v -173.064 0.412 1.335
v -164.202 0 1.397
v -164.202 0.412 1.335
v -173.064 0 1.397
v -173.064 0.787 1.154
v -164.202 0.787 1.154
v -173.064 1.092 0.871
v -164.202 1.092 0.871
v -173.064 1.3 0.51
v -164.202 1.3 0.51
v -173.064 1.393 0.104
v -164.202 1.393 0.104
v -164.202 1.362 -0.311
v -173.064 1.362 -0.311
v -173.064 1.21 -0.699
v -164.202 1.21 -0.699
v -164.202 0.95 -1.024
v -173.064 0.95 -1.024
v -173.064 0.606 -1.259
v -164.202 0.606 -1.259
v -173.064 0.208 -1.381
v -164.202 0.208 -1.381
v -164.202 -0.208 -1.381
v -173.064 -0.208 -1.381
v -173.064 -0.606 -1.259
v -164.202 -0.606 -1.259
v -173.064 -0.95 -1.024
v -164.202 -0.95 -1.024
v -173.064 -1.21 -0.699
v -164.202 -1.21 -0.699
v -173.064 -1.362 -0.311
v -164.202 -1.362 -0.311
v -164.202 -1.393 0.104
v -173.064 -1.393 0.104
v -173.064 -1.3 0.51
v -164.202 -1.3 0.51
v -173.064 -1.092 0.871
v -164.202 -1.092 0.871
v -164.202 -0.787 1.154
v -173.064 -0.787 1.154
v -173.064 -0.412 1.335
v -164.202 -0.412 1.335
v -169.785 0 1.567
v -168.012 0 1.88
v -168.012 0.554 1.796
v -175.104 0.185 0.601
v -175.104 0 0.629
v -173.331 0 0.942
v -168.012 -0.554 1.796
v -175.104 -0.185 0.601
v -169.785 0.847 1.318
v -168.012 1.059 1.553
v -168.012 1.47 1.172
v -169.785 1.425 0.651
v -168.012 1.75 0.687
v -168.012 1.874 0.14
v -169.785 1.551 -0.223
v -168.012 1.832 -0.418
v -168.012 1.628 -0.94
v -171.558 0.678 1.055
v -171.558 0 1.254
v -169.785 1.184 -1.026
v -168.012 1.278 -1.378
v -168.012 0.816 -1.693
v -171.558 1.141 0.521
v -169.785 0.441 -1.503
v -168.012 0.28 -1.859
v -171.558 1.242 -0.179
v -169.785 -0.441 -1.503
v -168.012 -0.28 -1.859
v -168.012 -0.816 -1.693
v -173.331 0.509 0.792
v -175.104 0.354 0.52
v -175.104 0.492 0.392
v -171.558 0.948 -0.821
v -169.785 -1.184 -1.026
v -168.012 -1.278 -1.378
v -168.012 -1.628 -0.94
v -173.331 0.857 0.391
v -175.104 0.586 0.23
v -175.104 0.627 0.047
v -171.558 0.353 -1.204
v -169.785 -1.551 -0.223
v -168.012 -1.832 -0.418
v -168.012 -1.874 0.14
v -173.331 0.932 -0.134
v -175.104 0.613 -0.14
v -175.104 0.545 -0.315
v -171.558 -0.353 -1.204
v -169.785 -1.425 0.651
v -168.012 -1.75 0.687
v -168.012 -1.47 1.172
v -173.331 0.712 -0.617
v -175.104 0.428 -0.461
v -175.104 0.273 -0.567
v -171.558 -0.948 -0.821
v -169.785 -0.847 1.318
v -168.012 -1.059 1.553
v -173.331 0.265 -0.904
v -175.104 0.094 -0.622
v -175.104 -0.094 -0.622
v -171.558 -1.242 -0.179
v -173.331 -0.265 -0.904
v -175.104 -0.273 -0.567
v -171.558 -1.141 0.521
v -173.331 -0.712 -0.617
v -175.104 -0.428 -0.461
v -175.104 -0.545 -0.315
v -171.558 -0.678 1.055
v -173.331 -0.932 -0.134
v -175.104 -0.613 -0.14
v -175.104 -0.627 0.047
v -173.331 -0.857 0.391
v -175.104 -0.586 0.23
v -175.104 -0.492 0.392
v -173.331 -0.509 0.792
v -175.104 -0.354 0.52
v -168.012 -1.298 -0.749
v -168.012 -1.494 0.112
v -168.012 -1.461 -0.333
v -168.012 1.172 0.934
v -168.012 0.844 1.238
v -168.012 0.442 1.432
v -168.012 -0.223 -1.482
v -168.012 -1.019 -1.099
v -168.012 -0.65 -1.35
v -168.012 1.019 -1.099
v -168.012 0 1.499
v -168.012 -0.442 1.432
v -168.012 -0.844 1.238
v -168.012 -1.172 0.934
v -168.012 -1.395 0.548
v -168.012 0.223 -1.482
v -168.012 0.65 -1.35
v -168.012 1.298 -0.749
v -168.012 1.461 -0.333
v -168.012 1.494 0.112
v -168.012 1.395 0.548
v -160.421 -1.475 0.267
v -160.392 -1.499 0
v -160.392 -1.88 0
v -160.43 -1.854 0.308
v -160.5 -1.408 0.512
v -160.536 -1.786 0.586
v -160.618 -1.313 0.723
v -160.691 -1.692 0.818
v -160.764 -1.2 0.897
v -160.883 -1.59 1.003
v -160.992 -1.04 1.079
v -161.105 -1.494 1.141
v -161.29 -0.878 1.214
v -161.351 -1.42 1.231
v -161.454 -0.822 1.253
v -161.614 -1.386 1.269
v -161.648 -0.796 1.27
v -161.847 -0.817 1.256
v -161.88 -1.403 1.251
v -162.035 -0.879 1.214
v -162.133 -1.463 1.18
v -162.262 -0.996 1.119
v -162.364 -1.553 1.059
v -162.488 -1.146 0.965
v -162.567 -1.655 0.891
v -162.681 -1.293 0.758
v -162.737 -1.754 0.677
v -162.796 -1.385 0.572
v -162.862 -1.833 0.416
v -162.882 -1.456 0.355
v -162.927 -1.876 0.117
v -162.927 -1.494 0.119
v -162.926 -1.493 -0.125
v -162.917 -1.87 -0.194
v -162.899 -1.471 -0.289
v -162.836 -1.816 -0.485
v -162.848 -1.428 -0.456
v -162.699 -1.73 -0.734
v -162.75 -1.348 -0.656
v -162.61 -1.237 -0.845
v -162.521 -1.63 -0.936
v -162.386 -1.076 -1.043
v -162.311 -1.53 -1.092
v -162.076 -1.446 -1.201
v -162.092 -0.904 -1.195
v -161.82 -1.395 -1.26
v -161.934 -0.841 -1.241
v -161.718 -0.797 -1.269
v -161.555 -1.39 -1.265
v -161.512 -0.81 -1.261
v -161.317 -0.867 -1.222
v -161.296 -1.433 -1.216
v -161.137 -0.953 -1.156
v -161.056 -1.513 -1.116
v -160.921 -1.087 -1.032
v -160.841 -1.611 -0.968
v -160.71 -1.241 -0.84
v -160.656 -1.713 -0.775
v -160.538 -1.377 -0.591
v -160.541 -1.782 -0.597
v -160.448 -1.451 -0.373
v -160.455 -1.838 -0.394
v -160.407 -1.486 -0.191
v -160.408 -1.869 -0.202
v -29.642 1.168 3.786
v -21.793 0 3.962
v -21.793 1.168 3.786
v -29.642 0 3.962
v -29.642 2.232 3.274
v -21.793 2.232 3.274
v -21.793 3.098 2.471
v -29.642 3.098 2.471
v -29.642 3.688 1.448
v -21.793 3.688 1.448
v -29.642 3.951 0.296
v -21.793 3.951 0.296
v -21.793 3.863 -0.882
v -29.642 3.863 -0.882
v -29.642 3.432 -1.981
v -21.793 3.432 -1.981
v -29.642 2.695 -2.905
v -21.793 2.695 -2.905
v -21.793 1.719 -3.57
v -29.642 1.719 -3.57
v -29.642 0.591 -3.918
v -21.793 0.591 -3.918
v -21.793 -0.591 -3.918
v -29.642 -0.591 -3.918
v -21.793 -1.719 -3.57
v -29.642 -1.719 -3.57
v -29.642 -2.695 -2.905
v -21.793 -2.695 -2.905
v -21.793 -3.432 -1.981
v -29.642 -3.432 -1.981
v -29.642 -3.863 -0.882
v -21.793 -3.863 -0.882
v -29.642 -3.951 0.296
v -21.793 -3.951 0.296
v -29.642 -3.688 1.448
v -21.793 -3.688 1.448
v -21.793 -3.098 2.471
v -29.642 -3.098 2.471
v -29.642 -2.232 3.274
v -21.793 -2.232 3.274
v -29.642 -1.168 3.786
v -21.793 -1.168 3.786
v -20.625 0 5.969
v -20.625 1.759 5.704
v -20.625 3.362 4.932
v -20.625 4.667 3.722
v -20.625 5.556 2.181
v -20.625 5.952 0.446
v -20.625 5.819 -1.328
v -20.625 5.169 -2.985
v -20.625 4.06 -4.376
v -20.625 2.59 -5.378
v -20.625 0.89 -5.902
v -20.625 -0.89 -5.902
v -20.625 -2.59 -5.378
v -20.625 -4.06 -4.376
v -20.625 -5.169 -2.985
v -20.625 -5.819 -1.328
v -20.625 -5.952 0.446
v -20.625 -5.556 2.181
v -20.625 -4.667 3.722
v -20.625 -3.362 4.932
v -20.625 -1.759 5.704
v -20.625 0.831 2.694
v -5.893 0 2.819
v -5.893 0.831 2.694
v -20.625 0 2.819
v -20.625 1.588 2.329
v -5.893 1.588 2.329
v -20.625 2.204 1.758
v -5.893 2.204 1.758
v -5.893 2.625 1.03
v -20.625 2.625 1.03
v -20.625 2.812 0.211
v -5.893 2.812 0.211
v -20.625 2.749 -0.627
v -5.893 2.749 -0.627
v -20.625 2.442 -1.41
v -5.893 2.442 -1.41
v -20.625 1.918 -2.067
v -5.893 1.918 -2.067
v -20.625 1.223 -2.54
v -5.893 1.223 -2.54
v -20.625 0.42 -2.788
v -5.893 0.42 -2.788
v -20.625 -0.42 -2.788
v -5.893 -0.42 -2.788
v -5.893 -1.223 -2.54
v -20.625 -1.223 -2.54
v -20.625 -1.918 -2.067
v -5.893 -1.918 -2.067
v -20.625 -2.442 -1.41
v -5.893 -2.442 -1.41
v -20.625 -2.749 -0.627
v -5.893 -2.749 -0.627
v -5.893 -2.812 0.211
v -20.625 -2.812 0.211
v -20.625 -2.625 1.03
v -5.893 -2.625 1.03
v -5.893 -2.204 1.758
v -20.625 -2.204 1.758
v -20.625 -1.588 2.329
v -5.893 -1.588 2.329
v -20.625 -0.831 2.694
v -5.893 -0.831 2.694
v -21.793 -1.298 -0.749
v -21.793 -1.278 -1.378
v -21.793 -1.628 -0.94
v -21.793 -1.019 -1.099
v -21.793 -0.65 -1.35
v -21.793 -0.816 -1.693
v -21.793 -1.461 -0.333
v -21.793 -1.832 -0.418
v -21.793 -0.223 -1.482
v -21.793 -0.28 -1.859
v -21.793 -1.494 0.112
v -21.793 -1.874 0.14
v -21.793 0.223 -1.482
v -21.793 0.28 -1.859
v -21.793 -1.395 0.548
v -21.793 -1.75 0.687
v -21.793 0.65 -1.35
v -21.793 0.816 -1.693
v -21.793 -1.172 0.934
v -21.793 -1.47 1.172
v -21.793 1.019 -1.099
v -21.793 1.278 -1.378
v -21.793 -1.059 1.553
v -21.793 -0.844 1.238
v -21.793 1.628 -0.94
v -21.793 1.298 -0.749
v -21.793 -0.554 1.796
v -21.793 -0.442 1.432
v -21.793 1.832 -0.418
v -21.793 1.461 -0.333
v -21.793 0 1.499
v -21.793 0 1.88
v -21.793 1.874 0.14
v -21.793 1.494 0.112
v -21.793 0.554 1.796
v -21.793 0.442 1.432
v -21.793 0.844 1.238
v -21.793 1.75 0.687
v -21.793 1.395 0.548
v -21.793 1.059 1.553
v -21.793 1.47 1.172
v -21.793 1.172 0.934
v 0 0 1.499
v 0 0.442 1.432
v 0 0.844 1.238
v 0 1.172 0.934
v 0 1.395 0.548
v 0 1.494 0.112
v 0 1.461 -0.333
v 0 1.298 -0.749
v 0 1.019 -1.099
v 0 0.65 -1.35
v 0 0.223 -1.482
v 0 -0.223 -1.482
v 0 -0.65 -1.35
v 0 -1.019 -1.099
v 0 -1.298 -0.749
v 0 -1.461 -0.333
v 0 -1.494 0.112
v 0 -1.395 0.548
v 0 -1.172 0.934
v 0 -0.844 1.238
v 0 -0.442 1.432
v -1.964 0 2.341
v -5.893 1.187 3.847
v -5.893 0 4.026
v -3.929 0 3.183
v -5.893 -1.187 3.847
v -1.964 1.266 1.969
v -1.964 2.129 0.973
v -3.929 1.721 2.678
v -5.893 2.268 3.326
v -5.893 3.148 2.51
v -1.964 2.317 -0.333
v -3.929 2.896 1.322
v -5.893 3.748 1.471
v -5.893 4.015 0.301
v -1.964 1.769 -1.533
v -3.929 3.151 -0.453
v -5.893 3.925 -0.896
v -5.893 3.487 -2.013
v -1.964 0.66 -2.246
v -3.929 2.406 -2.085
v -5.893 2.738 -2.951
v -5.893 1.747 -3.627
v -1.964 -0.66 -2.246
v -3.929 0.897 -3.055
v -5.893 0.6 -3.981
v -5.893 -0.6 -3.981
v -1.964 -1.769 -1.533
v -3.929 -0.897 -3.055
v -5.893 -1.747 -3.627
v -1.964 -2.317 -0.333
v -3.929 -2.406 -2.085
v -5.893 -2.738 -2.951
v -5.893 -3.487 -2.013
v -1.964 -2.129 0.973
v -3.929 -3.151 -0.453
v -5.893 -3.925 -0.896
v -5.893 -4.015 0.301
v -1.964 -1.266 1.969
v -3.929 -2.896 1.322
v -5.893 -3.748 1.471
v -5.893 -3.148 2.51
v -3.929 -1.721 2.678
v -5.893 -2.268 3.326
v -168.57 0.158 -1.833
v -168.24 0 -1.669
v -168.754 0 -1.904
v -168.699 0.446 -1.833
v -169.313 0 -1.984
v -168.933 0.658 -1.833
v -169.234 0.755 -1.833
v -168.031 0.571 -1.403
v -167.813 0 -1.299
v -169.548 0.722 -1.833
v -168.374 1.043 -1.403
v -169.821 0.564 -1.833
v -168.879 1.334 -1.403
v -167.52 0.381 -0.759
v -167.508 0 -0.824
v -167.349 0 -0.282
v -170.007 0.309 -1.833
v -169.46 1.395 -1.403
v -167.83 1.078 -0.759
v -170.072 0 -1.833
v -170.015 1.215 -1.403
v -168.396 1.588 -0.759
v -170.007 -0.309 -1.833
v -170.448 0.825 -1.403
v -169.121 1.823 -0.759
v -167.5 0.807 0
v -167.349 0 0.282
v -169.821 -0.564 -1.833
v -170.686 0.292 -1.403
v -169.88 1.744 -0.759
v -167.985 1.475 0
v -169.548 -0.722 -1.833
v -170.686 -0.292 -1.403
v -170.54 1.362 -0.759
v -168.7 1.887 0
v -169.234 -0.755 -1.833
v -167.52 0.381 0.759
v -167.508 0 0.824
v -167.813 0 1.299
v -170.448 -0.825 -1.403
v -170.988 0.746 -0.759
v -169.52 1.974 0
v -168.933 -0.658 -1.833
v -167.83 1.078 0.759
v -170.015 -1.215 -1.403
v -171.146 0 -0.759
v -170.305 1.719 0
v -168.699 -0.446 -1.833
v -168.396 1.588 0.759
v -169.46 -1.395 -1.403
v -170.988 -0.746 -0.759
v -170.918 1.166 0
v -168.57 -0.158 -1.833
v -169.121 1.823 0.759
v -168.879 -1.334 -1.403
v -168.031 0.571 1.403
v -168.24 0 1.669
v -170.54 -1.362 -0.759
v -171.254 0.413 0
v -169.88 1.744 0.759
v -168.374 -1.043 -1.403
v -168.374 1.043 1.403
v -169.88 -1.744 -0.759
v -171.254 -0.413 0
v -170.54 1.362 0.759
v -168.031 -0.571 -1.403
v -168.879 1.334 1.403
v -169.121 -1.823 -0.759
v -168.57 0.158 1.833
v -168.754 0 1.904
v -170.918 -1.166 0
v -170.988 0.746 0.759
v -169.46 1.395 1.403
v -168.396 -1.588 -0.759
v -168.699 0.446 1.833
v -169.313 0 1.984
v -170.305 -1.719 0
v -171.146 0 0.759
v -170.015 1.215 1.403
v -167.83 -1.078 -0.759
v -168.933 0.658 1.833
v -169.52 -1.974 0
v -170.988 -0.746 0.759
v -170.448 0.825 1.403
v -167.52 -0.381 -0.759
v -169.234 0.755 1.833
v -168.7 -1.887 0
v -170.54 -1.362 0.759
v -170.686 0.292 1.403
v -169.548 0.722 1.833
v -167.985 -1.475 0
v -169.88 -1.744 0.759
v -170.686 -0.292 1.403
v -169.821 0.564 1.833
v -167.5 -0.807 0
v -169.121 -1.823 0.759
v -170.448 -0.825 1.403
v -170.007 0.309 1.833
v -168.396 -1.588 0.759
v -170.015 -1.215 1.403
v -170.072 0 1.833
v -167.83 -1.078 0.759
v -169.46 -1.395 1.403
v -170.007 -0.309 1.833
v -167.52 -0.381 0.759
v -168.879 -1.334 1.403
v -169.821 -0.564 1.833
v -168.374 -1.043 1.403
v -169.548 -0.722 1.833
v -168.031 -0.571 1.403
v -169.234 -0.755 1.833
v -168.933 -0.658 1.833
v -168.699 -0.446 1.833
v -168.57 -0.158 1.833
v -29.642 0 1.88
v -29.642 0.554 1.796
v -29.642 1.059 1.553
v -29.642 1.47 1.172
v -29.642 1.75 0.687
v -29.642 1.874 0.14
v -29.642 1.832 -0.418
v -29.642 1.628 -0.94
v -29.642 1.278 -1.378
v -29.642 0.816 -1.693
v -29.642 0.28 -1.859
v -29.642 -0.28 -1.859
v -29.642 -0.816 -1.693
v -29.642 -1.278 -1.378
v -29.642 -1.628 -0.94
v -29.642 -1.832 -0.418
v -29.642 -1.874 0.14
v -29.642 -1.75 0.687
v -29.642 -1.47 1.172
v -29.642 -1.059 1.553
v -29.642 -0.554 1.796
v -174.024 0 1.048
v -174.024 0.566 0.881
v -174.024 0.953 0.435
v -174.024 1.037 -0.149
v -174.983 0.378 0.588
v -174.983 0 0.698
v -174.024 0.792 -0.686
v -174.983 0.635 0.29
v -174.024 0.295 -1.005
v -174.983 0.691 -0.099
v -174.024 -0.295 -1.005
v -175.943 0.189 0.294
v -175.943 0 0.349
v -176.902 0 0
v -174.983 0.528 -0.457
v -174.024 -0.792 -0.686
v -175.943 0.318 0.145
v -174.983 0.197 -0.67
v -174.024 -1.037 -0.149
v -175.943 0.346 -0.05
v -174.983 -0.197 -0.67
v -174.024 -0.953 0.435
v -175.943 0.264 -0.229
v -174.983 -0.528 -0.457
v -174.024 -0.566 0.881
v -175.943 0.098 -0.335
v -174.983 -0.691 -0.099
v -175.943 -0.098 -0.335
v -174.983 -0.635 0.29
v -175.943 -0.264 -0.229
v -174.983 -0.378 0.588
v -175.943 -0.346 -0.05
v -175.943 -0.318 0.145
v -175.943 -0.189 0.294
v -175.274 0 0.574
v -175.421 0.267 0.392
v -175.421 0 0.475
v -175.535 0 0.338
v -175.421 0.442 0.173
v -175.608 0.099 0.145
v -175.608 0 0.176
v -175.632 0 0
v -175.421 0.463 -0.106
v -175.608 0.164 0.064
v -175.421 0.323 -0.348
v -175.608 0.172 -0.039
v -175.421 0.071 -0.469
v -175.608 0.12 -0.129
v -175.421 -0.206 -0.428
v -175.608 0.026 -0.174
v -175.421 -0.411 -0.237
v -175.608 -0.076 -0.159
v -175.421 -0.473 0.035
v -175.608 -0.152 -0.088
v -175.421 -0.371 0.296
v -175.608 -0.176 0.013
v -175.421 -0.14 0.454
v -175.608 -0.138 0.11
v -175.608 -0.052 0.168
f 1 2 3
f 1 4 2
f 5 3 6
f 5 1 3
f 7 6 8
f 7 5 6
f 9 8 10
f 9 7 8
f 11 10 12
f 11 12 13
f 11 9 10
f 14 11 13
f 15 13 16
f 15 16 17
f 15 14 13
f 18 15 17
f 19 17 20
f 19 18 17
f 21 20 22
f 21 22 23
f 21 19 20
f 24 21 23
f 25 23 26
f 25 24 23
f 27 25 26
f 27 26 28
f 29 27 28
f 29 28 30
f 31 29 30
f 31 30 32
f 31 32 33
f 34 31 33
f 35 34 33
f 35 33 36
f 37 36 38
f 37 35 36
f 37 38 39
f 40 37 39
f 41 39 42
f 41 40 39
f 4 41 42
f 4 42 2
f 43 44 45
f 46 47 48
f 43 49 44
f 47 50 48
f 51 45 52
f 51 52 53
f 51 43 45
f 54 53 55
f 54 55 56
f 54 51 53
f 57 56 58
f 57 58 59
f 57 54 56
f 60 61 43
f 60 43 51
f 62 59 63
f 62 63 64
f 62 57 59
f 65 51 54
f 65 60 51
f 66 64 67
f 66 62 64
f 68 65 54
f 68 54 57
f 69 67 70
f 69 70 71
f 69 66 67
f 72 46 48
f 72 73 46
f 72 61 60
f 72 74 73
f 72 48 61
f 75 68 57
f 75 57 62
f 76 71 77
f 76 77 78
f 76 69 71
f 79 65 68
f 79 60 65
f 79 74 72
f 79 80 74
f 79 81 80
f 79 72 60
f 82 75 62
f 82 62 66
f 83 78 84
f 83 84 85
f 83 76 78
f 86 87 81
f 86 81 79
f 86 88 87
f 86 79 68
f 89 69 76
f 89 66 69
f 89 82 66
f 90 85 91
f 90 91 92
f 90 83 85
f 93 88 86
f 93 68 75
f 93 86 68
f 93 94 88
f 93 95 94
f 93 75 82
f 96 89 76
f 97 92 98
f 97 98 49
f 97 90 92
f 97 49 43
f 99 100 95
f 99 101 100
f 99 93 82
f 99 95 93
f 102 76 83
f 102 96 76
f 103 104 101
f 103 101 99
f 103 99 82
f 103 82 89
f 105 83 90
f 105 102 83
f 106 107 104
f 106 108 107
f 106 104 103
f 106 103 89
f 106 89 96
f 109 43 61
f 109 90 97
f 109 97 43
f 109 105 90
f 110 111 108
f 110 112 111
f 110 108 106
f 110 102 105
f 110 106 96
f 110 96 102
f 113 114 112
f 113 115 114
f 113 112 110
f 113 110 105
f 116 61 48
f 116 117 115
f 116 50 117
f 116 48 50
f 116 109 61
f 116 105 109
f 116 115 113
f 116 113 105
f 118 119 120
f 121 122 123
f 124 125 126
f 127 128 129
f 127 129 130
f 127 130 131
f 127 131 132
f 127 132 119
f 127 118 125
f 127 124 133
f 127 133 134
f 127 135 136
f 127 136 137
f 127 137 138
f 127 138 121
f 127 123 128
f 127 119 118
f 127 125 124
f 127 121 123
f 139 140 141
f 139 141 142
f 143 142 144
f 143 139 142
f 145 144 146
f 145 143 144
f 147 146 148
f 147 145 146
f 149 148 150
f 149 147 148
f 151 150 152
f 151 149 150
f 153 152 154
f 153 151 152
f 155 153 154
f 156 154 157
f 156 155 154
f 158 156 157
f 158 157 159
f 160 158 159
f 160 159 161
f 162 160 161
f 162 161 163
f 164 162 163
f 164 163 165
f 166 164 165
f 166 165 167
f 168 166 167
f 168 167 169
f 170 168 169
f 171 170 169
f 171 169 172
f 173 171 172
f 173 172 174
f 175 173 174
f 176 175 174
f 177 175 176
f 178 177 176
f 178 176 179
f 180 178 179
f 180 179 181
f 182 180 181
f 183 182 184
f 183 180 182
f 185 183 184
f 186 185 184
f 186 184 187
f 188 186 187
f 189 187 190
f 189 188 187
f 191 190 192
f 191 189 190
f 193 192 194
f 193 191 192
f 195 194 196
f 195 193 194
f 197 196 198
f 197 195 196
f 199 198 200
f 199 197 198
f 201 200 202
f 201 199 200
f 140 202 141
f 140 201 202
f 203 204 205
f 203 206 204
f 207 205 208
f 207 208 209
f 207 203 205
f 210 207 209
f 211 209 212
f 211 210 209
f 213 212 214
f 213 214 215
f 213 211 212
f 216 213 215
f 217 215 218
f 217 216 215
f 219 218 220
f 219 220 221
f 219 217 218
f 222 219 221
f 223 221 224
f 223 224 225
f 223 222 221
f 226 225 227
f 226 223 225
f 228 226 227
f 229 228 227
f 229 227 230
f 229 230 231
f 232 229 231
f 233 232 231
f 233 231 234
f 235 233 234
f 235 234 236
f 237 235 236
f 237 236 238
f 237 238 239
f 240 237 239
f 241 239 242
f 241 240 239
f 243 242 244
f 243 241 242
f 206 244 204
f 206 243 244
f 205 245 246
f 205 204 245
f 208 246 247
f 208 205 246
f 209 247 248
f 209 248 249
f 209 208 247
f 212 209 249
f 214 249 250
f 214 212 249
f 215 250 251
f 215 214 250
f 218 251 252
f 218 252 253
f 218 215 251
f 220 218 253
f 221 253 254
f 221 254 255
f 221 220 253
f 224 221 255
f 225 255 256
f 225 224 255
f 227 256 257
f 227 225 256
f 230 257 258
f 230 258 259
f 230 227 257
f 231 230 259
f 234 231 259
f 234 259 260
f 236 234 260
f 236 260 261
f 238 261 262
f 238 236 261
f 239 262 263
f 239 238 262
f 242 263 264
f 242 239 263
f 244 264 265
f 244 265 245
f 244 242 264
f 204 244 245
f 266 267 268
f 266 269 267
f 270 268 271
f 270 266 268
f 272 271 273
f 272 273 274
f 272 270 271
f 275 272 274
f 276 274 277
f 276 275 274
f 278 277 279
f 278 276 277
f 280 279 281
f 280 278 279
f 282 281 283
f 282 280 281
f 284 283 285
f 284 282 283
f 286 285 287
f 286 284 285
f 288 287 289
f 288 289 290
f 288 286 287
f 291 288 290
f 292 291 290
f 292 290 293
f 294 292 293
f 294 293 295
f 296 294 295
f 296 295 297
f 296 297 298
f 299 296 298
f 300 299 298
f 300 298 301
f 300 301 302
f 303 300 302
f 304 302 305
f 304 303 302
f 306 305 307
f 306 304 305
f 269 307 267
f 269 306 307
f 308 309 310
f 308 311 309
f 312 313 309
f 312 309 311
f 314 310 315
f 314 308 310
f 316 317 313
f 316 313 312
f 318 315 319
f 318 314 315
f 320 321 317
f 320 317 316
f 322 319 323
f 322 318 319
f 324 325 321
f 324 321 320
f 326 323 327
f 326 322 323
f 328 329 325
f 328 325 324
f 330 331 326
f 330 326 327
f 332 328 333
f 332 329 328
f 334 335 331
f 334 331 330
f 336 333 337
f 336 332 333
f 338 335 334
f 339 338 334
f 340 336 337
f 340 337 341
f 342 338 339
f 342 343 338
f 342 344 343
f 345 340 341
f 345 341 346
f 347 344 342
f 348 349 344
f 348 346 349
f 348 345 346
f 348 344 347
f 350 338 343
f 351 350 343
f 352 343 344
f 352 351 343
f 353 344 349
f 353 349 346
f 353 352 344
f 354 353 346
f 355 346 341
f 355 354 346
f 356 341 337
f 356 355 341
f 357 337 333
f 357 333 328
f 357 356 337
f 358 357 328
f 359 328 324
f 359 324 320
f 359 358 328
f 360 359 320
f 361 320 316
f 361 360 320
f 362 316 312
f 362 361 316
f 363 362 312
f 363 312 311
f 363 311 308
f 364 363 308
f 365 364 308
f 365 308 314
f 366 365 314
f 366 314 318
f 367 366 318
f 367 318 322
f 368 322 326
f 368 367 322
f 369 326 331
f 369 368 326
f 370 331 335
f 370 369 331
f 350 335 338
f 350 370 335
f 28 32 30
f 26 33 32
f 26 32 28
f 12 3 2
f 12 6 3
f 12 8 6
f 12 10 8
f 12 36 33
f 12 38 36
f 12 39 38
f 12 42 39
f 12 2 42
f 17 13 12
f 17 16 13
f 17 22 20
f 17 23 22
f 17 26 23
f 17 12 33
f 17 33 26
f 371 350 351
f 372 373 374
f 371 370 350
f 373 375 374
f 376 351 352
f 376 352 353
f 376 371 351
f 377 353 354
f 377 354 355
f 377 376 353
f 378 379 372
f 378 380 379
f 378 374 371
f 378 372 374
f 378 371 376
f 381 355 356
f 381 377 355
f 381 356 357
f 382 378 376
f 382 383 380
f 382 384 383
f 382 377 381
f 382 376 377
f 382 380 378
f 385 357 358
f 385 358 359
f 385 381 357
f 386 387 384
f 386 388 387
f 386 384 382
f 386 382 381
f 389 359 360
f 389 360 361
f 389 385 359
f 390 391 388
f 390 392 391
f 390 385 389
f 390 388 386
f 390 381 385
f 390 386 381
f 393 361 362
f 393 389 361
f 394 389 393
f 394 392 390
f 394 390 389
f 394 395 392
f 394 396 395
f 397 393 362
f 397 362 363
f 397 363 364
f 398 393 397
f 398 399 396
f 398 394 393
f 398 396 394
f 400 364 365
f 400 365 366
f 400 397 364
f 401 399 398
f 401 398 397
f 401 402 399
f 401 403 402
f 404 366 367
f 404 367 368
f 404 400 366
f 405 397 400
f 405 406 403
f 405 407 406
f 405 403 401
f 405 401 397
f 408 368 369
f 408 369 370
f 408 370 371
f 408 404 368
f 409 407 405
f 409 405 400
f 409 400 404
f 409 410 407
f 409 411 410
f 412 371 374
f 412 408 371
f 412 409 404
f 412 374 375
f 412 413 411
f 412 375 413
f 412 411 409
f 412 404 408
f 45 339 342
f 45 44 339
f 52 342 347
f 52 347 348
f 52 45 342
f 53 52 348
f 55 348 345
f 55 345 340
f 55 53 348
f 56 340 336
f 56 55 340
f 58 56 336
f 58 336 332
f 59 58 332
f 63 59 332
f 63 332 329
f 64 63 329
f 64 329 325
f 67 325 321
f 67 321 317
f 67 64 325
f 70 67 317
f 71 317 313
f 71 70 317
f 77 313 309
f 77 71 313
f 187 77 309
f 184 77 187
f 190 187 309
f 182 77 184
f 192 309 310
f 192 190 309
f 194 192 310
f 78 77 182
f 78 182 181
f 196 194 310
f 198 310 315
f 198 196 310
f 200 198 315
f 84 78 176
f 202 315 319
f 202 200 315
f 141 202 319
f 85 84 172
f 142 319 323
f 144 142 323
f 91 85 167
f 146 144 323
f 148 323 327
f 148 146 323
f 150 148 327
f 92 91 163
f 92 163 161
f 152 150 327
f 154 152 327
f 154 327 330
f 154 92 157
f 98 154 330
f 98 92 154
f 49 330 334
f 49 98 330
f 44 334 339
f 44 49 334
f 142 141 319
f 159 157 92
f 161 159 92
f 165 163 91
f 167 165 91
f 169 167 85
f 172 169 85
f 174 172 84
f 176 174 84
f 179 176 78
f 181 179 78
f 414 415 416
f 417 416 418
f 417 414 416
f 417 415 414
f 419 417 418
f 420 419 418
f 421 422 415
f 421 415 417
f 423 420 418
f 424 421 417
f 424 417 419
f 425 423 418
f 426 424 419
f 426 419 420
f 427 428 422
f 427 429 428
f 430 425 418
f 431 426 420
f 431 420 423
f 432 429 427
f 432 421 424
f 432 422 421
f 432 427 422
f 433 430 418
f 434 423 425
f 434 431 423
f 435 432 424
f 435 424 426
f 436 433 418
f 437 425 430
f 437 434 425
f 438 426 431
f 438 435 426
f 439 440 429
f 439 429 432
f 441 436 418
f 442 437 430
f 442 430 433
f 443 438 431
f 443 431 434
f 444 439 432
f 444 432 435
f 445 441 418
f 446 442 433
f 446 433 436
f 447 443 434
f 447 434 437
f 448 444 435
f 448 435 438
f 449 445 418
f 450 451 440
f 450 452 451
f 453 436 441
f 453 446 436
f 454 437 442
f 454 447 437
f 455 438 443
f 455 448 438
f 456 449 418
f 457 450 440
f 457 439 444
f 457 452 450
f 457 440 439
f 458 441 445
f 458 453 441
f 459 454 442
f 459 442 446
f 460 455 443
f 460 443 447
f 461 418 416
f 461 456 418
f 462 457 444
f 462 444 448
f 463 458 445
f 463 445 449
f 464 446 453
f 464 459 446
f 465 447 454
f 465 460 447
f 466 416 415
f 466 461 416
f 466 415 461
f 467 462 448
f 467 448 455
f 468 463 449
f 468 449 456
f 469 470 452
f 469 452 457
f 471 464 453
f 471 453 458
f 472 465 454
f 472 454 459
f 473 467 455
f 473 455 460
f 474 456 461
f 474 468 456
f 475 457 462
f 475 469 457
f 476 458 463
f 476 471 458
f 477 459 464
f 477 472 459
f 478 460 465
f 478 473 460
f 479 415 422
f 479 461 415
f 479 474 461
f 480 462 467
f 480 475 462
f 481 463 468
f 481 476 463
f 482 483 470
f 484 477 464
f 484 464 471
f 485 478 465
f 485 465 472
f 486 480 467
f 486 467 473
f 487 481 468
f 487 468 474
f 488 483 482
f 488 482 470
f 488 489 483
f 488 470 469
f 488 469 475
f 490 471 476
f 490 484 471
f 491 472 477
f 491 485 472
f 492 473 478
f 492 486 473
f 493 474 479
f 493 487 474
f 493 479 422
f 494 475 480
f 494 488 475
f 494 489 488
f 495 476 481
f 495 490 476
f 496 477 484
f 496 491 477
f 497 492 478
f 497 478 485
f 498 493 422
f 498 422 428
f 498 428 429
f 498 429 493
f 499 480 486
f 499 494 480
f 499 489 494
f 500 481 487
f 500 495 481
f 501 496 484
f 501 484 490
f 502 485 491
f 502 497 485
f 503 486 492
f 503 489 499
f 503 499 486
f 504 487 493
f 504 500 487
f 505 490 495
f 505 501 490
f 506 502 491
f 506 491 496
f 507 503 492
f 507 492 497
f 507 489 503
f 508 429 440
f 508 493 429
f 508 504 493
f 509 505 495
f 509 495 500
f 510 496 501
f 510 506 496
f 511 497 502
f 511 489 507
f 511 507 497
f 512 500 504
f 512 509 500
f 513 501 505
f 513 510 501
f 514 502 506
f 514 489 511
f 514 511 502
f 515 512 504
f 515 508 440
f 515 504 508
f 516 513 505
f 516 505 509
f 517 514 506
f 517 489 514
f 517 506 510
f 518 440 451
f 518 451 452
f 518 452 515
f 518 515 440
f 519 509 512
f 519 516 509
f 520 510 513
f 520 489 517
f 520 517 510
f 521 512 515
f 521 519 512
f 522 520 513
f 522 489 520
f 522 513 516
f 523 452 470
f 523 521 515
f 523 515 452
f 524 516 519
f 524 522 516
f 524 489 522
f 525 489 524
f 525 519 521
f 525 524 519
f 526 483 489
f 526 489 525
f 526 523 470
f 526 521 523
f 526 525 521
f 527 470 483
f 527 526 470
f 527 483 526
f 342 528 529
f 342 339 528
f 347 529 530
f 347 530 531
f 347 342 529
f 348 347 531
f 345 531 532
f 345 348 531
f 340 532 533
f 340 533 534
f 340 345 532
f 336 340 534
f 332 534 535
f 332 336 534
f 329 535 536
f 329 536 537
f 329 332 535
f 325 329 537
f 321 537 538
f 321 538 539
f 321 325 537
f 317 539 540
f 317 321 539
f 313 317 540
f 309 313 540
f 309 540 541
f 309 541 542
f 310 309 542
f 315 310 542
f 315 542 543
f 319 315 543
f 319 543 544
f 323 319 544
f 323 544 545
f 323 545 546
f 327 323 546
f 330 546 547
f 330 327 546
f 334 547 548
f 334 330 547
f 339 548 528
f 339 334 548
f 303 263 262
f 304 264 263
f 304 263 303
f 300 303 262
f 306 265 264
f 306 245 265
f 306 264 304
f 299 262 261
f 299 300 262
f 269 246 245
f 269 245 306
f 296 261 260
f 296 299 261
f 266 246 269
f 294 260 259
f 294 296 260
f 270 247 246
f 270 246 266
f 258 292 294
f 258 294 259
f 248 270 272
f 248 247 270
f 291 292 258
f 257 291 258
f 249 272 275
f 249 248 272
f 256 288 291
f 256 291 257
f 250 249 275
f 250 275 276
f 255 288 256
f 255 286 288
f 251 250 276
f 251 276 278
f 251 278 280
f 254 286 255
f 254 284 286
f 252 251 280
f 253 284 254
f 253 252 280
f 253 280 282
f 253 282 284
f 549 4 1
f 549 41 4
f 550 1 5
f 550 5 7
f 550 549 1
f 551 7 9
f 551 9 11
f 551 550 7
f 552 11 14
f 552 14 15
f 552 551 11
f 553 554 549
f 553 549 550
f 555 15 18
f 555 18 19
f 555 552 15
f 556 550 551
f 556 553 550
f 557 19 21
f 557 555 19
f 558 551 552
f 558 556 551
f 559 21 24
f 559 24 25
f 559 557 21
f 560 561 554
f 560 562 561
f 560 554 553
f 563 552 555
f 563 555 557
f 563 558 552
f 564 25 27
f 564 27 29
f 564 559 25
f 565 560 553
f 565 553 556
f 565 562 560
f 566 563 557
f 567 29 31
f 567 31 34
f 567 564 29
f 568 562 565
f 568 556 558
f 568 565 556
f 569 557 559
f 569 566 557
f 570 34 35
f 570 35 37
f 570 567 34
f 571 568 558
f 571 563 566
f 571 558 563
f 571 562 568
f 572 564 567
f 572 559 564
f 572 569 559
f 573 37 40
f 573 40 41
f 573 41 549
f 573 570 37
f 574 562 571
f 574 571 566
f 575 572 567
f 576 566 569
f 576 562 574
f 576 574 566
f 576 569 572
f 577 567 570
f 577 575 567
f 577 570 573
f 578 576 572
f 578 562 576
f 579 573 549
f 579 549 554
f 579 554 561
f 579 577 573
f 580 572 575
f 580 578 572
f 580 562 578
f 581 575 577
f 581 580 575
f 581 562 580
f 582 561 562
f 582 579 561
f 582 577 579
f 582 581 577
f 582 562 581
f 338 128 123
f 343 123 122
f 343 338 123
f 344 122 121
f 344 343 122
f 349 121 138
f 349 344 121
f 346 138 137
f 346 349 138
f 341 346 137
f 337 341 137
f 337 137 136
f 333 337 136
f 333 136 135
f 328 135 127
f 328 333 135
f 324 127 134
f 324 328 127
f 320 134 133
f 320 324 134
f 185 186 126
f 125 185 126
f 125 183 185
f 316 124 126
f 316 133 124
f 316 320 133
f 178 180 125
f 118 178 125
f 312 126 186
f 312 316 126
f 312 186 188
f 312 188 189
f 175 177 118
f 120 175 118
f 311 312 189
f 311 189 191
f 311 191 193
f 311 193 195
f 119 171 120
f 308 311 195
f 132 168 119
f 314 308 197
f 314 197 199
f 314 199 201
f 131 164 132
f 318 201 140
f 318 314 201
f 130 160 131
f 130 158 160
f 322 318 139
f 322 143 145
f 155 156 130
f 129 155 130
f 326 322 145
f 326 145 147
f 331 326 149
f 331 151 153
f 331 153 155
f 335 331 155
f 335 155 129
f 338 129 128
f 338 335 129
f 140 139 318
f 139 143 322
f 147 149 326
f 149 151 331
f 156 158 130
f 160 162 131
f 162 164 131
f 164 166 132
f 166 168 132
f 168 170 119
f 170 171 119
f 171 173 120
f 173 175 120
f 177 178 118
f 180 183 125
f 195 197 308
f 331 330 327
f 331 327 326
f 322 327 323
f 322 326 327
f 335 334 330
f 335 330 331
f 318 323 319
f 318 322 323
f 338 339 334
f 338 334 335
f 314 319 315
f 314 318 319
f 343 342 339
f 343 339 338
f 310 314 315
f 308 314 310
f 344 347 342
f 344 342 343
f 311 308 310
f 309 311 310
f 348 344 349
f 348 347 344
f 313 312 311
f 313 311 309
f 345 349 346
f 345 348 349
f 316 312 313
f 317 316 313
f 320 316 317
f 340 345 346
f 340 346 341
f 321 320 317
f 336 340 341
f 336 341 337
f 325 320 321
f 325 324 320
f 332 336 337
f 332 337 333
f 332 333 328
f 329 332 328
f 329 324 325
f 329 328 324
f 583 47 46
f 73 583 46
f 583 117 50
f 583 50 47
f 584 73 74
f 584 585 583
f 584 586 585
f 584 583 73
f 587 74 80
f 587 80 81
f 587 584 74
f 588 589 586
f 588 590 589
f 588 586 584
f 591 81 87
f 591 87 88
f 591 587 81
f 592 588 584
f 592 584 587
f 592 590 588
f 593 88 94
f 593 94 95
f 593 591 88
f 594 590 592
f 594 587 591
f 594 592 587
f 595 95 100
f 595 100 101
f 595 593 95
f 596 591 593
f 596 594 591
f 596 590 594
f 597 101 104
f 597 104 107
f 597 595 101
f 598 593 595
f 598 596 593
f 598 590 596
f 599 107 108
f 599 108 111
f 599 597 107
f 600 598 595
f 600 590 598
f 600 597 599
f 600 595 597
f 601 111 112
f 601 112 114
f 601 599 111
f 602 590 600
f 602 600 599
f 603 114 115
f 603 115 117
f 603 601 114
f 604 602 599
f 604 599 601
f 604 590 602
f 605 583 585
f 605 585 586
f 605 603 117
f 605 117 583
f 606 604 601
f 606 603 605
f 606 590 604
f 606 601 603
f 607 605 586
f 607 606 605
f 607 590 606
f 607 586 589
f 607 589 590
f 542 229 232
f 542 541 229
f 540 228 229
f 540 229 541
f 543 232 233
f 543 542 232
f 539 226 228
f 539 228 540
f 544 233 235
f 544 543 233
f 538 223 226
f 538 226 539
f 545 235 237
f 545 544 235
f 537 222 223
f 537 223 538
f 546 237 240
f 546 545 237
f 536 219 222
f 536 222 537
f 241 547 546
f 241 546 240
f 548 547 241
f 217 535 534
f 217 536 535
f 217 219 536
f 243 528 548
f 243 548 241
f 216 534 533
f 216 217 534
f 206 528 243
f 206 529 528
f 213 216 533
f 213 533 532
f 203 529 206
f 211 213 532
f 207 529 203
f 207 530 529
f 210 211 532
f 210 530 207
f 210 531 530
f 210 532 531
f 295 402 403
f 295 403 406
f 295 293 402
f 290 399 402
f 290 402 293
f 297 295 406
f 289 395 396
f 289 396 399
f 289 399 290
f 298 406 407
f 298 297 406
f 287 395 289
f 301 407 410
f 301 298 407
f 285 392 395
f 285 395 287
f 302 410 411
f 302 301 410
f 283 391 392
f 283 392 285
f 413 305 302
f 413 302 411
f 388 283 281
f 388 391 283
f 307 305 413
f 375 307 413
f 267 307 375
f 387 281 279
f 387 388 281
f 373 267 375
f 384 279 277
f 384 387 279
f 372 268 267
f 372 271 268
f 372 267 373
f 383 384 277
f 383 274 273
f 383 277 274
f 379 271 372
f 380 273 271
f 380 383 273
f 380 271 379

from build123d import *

# Parameters (mm, degrees)
F3_W          = 14.029525
F3_H          = 3.7592
F4_DEPTH      = 5.97
F4_DEPTH_BACK = 5.97
F7_R          = 1.27
F8_DEPTH      = 5.97


with BuildPart() as f1:
    # F0 (on Front) → F1 (revolve)
    with BuildSketch(Plane.XZ):
        Polygon((-182.0418, 1.8796), (-182.0418, 1.4986), (-21.7932, 1.4986), (-21.7932, 1.8796), (-29.6418, 1.8796), align=None)
    revolve(axis=Axis((-91.0209, 0, 0), (-1, 0, 0)))

    # F3 (on Front) → F4 (cut, two sides)
    with BuildSketch(Plane.XZ) as f4_sk:
        with Locations((-175.027038, 0)):
            Rectangle(F3_W, F3_H)
    extrude(amount=-F4_DEPTH, mode=Mode.SUBTRACT)
    extrude(f4_sk.sketch, amount=-F4_DEPTH_BACK, mode=Mode.SUBTRACT)

    # F5 (on Front) → F6 (revolve)
    with BuildSketch(Plane.XZ):
        with BuildLine():
            Line((-168.012275, 0), (-168.012275, 1.8796))
            Line((-168.012275, 1.8796), (-175.104429, 0.629062))
            ThreePointArc((-175.104429, 0.629062), (-175.482832, 0.410591), (-175.632275, 0))
            Line((-175.632275, 0), (-168.012275, 0))
        make_face()
    revolve(axis=Axis((-173.567227, 0, 0), (-1, 0, 0)))

    # F7 (on Front) → F8 (cut, through all)
    with BuildSketch(Plane.XZ):
        with Locations((-161.662275, 0)):
            Circle(F7_R)
    extrude(amount=F8_DEPTH, mode=Mode.SUBTRACT)


with BuildPart() as f2:
    # F0 (on Front) → F2 (revolve)
    with BuildSketch(Plane.XZ):
        Polygon((-21.7932, 1.8796), (-21.7932, 1.4986), (0, 1.4986), (-5.8928, 4.0259), (-5.8928, 2.8194), (-20.6248, 2.8194), (-20.6248, 5.969), (-21.7932, 3.9624), (-29.6418, 3.9624), (-29.6418, 1.8796), align=None)
    revolve(axis=Axis((-91.0209, 0, 0), (-1, 0, 0)))


with BuildPart() as f10:
    # F9 (on Front) → F10 (revolve)
    with BuildSketch(Plane.XZ):
        with BuildLine():
            Line((-169.313021, 1.984375), (-169.313021, -1.984375))
            ThreePointArc((-169.313021, -1.984375), (-167.328646, 0), (-169.313021, 1.984375))
        make_face()
    revolve(axis=Axis((-169.313021, 0, 1.325225), (0, 0, 1)))


with BuildPart() as f12:
    # F11 (on Front) → F12 (revolve)
    with BuildSketch(Plane.XZ):
        Polygon((-164.202275, 1.397), (-173.064049, 1.397), (-176.902275, 0), (-164.202275, 0), align=None)
    revolve(axis=Axis((-174.067578, 0, 0), (-1, 0, 0)))


solid = Compound([f1.part, f2.part, f10.part, f12.part])
